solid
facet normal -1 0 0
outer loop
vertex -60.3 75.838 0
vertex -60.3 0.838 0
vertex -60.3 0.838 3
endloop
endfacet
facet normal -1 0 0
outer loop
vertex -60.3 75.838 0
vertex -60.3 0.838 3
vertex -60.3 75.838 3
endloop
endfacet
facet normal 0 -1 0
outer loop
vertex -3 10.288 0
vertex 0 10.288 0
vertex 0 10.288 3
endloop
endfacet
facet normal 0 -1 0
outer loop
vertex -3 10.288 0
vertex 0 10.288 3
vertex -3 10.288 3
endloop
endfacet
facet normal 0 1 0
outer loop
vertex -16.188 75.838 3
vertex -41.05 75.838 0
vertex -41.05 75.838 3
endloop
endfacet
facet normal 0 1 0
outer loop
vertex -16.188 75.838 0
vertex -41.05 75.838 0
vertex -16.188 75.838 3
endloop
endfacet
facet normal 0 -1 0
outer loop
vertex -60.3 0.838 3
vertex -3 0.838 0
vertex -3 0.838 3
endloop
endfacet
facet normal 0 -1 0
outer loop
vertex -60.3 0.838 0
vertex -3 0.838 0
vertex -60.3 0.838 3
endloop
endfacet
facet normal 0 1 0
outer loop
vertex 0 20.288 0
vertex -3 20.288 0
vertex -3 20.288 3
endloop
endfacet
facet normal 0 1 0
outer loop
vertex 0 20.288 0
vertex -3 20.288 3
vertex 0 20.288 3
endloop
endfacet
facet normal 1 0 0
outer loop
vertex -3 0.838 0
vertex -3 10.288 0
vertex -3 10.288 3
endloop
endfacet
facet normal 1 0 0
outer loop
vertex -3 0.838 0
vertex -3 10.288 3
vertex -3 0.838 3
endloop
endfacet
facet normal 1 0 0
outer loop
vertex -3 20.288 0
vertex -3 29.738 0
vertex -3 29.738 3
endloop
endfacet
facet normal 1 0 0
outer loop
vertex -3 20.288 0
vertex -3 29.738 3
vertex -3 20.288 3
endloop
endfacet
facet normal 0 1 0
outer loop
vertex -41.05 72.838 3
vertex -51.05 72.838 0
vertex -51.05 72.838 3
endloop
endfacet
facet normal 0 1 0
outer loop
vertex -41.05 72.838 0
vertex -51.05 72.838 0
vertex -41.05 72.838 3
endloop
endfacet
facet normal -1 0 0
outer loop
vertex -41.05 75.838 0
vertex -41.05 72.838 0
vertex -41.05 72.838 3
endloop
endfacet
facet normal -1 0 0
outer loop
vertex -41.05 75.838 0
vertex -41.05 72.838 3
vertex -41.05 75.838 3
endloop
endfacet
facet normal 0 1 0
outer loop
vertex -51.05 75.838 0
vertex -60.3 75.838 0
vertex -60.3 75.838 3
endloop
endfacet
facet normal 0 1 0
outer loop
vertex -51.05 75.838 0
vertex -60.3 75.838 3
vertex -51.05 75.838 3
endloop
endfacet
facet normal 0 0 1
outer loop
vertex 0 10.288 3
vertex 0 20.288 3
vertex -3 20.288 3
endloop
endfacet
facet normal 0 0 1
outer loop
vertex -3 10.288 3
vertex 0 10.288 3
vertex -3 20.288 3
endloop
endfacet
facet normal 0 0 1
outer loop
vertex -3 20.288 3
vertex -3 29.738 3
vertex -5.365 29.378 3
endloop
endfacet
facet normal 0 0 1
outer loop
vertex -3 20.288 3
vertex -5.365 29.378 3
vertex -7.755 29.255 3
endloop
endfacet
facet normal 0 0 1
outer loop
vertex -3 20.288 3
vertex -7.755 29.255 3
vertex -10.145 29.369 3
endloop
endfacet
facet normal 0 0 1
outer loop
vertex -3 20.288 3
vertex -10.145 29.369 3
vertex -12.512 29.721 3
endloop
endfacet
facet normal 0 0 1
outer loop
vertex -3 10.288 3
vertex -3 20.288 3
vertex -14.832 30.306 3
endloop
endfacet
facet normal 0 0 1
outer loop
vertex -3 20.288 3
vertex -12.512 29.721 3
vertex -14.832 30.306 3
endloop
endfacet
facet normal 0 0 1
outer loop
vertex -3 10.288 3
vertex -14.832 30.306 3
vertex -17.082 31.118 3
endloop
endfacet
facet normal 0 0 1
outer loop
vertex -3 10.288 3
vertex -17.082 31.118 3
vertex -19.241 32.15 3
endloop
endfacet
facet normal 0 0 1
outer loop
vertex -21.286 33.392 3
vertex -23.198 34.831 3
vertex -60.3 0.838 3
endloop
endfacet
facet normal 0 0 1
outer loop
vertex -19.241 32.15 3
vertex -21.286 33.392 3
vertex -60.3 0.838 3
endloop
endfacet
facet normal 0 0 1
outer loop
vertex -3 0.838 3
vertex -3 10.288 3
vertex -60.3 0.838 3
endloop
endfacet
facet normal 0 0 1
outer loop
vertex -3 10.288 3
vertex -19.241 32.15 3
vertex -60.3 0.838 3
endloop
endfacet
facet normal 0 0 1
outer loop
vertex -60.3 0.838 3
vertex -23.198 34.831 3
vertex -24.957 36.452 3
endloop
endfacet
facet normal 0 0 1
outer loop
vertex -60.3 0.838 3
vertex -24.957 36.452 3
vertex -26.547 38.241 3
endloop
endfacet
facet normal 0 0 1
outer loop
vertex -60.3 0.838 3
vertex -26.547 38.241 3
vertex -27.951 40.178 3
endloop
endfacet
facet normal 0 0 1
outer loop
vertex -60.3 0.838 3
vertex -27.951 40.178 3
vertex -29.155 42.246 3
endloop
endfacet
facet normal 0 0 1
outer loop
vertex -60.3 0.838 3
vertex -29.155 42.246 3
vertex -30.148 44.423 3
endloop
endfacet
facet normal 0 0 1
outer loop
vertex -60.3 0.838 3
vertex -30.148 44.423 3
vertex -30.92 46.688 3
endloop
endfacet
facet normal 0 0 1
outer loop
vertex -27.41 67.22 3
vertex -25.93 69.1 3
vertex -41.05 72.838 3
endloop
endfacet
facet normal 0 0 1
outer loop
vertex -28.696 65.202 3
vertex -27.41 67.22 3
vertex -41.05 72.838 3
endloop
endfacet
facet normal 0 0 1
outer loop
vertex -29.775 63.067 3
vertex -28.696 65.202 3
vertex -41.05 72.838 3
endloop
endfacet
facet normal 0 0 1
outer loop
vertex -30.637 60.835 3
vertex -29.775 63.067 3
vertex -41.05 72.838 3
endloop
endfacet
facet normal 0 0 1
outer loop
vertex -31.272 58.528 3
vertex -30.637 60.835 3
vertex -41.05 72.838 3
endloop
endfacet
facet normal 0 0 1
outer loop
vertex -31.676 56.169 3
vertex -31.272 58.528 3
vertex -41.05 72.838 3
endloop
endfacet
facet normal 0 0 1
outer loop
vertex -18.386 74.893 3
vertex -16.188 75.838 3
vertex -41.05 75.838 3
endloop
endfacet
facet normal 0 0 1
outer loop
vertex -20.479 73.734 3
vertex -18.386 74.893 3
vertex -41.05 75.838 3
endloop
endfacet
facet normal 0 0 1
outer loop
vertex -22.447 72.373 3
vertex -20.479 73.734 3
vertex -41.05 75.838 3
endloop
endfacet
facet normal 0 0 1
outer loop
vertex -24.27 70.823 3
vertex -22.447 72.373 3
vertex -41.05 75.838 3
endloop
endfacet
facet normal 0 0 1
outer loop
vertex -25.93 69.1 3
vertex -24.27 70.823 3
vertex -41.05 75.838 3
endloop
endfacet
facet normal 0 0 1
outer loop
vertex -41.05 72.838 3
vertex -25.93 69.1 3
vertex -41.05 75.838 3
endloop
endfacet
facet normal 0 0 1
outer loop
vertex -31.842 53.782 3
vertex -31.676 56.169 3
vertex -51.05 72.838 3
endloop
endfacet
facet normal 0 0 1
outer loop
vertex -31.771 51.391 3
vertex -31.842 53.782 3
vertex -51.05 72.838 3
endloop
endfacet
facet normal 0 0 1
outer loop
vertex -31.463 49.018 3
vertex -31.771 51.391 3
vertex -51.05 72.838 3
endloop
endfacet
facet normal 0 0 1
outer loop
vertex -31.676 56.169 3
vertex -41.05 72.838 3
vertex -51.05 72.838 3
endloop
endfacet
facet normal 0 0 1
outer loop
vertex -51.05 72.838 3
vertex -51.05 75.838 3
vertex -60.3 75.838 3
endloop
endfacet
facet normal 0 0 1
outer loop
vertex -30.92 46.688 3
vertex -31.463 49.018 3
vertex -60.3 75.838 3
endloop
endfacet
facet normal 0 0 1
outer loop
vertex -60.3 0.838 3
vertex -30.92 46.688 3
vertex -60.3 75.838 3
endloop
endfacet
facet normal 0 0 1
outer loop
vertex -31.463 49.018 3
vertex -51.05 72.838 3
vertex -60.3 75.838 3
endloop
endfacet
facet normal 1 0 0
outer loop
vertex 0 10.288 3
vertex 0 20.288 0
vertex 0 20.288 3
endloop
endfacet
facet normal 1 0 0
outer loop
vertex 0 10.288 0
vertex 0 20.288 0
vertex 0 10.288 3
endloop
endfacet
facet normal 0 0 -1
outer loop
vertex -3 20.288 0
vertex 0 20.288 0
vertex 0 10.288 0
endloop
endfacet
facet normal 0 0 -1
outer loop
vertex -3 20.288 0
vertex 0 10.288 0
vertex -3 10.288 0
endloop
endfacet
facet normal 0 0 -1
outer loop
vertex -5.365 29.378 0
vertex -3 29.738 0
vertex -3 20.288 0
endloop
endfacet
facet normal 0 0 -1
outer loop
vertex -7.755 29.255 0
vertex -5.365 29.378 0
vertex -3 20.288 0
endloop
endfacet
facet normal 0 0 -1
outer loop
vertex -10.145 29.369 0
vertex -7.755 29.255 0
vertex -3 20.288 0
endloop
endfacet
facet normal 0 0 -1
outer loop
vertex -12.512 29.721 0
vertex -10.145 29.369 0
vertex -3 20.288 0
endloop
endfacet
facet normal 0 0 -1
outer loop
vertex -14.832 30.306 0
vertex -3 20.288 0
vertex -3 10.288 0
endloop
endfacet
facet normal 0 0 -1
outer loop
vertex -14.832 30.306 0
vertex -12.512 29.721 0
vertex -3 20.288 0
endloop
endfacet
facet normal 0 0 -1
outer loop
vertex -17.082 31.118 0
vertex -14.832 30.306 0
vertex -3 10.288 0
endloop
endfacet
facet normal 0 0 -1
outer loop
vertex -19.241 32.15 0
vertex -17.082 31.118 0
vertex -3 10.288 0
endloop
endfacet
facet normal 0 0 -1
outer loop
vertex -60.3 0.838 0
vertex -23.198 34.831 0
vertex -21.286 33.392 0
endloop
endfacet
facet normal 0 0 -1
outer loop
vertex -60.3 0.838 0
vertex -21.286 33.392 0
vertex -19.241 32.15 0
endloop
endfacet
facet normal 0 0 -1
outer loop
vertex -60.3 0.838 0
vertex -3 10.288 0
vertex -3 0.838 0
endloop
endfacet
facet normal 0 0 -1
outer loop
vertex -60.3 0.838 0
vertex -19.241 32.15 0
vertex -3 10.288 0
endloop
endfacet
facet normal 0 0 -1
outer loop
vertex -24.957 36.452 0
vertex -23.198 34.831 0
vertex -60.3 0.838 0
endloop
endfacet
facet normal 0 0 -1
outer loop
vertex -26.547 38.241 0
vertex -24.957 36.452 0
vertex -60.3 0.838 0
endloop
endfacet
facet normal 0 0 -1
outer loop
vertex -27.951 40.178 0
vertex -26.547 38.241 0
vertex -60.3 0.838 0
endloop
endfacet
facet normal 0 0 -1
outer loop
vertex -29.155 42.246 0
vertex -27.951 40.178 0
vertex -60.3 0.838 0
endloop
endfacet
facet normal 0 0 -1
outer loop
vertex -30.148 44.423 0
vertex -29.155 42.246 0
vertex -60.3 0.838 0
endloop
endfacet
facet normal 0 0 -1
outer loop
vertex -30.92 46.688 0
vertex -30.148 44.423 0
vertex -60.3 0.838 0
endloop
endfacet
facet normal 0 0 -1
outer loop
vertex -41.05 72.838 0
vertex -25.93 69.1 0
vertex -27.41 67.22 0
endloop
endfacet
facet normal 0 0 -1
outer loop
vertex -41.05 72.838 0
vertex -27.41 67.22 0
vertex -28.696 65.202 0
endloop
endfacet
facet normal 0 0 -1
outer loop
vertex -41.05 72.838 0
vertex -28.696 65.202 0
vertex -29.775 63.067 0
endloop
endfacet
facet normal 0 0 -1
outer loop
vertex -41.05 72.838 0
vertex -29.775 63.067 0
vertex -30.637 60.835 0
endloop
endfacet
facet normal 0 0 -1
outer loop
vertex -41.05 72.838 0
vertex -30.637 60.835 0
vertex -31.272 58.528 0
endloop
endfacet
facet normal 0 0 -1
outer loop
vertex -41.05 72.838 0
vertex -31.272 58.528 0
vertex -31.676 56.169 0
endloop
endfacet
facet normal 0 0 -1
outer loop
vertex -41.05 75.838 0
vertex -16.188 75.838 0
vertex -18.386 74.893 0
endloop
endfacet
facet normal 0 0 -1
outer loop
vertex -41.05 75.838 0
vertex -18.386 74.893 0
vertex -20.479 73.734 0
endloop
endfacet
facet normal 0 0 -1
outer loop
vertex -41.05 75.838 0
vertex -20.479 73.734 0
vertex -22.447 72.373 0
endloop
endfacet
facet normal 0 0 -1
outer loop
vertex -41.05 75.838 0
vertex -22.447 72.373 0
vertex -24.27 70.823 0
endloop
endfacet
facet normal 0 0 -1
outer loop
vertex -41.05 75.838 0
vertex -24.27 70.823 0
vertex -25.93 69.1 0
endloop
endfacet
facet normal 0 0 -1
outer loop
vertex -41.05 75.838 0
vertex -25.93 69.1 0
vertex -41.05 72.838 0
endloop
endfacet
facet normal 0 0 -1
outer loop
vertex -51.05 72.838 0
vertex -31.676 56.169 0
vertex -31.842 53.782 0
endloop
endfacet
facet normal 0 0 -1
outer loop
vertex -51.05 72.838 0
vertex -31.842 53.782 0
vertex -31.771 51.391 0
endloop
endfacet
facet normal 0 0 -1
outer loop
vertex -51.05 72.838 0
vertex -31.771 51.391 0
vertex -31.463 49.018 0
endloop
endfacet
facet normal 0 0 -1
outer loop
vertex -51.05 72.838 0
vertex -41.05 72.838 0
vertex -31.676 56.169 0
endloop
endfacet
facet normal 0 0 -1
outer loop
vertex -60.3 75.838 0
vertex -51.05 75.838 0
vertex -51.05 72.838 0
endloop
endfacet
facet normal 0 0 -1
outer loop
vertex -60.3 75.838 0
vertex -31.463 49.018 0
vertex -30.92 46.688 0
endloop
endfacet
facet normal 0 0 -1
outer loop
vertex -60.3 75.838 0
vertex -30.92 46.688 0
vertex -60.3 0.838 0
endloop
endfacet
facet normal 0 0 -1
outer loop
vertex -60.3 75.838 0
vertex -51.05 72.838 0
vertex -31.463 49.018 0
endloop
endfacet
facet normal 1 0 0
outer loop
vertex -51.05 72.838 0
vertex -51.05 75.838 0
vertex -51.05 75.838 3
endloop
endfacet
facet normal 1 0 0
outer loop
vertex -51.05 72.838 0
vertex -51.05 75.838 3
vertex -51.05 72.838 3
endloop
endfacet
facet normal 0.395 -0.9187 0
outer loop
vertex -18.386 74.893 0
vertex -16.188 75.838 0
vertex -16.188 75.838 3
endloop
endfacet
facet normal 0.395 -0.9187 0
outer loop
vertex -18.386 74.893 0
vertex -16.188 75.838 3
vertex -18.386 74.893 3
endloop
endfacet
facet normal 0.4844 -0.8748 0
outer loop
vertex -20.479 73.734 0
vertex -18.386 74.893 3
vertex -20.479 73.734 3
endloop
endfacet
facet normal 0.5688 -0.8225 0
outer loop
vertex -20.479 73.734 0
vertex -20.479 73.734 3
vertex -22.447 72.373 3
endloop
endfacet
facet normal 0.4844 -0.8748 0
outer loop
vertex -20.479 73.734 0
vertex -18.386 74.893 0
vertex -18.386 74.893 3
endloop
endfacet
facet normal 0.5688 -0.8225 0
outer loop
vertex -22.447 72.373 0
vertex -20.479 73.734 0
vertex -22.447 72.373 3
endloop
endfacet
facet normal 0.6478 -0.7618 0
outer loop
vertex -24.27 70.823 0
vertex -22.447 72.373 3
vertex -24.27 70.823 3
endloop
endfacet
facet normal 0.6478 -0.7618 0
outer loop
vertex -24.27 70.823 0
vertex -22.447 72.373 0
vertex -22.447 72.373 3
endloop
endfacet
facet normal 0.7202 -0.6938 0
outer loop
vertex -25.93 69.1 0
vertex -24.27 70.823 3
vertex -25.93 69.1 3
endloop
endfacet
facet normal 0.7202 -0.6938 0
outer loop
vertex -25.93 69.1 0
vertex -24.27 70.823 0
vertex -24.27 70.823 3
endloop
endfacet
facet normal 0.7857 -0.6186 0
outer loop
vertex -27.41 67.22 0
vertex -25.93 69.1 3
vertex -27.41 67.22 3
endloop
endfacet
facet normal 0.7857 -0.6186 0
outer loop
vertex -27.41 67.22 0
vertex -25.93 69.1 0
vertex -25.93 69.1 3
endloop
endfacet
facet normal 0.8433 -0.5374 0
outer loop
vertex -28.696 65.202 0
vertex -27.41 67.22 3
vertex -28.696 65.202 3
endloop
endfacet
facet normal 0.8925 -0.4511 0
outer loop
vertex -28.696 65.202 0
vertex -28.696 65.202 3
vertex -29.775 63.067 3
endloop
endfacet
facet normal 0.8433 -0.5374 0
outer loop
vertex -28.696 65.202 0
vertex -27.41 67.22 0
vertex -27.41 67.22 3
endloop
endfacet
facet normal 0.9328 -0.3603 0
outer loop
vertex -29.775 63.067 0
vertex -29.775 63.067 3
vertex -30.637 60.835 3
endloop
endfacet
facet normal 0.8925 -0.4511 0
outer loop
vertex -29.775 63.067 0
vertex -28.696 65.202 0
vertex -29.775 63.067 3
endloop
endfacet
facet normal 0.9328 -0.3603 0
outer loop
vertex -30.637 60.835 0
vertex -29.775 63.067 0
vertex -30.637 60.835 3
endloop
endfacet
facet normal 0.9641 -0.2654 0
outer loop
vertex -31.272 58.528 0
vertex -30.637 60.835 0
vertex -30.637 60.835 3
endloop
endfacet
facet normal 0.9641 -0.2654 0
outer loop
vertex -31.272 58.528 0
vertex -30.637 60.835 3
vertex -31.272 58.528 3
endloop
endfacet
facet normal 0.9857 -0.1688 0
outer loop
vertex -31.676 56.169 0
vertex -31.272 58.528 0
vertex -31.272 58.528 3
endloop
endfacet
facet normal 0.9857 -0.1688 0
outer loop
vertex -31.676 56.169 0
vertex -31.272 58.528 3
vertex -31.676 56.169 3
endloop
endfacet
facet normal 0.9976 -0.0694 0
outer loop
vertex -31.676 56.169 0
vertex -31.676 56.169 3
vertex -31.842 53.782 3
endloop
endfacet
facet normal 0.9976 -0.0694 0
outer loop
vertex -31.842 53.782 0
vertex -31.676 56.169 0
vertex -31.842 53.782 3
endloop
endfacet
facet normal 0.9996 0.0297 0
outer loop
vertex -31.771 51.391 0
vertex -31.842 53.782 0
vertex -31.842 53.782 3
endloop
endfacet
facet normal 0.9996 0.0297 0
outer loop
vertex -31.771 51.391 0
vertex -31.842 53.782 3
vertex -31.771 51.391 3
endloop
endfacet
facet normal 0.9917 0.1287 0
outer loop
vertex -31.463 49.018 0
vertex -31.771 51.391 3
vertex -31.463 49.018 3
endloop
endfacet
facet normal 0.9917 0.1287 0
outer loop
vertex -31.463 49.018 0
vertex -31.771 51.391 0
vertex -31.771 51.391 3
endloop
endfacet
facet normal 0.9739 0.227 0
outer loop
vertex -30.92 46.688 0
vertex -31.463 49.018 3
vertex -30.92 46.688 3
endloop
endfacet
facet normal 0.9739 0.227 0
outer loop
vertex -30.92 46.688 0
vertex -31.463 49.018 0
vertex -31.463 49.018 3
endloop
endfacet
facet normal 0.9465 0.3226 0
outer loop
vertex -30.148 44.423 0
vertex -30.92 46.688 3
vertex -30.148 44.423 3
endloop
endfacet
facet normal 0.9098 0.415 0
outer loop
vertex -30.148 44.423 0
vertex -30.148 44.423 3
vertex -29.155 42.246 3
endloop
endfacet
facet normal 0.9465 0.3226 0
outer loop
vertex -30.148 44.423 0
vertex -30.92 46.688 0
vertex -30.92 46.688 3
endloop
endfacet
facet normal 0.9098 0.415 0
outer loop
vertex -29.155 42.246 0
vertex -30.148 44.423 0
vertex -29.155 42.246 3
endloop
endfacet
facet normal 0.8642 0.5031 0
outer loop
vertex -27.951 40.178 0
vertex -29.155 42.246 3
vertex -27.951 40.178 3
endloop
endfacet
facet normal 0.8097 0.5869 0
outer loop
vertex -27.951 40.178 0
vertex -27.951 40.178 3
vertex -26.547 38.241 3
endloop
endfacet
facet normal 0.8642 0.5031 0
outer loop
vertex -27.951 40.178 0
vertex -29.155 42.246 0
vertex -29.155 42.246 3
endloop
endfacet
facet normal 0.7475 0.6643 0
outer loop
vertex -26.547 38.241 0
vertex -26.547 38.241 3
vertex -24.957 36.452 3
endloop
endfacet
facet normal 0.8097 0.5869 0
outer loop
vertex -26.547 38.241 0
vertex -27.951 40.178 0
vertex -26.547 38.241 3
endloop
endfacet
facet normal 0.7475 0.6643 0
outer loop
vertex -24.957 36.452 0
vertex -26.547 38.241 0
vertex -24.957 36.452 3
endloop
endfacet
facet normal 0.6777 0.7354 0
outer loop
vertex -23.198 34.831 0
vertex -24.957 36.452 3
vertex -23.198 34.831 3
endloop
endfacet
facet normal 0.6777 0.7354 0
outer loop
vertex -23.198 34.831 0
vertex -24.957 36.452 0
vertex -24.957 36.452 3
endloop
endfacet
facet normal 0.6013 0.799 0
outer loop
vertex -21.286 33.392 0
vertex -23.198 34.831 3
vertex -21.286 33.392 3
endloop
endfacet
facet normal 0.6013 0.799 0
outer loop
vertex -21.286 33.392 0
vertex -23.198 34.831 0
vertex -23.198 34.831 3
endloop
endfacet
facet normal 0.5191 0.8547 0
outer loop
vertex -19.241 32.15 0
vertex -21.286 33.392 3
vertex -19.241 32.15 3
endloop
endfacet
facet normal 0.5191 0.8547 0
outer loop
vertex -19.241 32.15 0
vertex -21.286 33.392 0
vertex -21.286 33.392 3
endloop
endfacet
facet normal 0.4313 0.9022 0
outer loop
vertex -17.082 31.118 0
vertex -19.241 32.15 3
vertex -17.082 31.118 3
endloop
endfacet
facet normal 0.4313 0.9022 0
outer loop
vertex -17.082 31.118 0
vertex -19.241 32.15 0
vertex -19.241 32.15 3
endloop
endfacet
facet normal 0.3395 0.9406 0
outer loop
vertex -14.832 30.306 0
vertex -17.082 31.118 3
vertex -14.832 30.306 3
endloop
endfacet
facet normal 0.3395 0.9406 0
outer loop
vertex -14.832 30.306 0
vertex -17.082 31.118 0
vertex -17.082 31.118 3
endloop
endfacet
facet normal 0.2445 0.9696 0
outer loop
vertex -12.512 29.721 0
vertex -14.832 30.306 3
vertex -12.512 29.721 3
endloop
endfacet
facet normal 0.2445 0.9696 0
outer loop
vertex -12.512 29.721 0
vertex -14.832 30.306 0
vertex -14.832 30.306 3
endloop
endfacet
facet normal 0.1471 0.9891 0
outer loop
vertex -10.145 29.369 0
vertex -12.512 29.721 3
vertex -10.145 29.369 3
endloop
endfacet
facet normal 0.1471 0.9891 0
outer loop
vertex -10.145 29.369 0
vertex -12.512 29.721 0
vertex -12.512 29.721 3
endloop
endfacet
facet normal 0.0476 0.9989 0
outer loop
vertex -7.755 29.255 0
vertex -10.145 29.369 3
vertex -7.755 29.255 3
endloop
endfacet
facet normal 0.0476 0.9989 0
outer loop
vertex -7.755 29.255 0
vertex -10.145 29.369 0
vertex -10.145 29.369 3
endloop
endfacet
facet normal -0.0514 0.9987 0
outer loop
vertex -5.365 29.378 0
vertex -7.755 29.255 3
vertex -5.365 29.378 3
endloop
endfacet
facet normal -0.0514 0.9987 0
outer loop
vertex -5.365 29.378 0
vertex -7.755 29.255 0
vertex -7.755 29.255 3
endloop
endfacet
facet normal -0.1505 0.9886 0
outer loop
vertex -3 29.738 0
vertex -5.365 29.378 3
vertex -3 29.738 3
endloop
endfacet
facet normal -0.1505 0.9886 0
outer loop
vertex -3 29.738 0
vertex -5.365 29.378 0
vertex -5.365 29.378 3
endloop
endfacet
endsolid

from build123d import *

# Parameters (mm, degrees)
SALIENTE_EXTRUIR1_DEPTH = 3


with BuildPart() as part:
    # Croquis1 → Saliente-Extruir1 (new body)
    with BuildSketch(Plane.XY):
        with BuildLine():
            Line((-3, 0.83840696), (-60.3, 0.83840696))
            Line((-60.3, 0.83840696), (-60.3, 75.83840696))
            Line((-60.3, 75.83840696), (-51.05, 75.83840696))
            Line((-51.05, 75.83840696), (-51.05, 72.83840696))
            Line((-51.05, 72.83840696), (-41.05, 72.83840696))
            Line((-41.05, 72.83840696), (-41.05, 75.83840696))
            Line((-41.05, 75.83840696), (-16.187910348, 75.83840696))
            ThreePointArc((-16.187910348, 75.83840696), (-30.919705343, 46.687711053), (-3, 29.73840696))
            Line((-3, 29.73840696), (-3, 20.28840696))
            Line((-3, 20.28840696), (0, 20.28840696))
            Line((0, 20.28840696), (0, 10.28840696))
            Line((0, 10.28840696), (-3, 10.28840696))
            Line((-3, 10.28840696), (-3, 0.83840696))
        make_face()
    extrude(amount=SALIENTE_EXTRUIR1_DEPTH)


solid = part.part
